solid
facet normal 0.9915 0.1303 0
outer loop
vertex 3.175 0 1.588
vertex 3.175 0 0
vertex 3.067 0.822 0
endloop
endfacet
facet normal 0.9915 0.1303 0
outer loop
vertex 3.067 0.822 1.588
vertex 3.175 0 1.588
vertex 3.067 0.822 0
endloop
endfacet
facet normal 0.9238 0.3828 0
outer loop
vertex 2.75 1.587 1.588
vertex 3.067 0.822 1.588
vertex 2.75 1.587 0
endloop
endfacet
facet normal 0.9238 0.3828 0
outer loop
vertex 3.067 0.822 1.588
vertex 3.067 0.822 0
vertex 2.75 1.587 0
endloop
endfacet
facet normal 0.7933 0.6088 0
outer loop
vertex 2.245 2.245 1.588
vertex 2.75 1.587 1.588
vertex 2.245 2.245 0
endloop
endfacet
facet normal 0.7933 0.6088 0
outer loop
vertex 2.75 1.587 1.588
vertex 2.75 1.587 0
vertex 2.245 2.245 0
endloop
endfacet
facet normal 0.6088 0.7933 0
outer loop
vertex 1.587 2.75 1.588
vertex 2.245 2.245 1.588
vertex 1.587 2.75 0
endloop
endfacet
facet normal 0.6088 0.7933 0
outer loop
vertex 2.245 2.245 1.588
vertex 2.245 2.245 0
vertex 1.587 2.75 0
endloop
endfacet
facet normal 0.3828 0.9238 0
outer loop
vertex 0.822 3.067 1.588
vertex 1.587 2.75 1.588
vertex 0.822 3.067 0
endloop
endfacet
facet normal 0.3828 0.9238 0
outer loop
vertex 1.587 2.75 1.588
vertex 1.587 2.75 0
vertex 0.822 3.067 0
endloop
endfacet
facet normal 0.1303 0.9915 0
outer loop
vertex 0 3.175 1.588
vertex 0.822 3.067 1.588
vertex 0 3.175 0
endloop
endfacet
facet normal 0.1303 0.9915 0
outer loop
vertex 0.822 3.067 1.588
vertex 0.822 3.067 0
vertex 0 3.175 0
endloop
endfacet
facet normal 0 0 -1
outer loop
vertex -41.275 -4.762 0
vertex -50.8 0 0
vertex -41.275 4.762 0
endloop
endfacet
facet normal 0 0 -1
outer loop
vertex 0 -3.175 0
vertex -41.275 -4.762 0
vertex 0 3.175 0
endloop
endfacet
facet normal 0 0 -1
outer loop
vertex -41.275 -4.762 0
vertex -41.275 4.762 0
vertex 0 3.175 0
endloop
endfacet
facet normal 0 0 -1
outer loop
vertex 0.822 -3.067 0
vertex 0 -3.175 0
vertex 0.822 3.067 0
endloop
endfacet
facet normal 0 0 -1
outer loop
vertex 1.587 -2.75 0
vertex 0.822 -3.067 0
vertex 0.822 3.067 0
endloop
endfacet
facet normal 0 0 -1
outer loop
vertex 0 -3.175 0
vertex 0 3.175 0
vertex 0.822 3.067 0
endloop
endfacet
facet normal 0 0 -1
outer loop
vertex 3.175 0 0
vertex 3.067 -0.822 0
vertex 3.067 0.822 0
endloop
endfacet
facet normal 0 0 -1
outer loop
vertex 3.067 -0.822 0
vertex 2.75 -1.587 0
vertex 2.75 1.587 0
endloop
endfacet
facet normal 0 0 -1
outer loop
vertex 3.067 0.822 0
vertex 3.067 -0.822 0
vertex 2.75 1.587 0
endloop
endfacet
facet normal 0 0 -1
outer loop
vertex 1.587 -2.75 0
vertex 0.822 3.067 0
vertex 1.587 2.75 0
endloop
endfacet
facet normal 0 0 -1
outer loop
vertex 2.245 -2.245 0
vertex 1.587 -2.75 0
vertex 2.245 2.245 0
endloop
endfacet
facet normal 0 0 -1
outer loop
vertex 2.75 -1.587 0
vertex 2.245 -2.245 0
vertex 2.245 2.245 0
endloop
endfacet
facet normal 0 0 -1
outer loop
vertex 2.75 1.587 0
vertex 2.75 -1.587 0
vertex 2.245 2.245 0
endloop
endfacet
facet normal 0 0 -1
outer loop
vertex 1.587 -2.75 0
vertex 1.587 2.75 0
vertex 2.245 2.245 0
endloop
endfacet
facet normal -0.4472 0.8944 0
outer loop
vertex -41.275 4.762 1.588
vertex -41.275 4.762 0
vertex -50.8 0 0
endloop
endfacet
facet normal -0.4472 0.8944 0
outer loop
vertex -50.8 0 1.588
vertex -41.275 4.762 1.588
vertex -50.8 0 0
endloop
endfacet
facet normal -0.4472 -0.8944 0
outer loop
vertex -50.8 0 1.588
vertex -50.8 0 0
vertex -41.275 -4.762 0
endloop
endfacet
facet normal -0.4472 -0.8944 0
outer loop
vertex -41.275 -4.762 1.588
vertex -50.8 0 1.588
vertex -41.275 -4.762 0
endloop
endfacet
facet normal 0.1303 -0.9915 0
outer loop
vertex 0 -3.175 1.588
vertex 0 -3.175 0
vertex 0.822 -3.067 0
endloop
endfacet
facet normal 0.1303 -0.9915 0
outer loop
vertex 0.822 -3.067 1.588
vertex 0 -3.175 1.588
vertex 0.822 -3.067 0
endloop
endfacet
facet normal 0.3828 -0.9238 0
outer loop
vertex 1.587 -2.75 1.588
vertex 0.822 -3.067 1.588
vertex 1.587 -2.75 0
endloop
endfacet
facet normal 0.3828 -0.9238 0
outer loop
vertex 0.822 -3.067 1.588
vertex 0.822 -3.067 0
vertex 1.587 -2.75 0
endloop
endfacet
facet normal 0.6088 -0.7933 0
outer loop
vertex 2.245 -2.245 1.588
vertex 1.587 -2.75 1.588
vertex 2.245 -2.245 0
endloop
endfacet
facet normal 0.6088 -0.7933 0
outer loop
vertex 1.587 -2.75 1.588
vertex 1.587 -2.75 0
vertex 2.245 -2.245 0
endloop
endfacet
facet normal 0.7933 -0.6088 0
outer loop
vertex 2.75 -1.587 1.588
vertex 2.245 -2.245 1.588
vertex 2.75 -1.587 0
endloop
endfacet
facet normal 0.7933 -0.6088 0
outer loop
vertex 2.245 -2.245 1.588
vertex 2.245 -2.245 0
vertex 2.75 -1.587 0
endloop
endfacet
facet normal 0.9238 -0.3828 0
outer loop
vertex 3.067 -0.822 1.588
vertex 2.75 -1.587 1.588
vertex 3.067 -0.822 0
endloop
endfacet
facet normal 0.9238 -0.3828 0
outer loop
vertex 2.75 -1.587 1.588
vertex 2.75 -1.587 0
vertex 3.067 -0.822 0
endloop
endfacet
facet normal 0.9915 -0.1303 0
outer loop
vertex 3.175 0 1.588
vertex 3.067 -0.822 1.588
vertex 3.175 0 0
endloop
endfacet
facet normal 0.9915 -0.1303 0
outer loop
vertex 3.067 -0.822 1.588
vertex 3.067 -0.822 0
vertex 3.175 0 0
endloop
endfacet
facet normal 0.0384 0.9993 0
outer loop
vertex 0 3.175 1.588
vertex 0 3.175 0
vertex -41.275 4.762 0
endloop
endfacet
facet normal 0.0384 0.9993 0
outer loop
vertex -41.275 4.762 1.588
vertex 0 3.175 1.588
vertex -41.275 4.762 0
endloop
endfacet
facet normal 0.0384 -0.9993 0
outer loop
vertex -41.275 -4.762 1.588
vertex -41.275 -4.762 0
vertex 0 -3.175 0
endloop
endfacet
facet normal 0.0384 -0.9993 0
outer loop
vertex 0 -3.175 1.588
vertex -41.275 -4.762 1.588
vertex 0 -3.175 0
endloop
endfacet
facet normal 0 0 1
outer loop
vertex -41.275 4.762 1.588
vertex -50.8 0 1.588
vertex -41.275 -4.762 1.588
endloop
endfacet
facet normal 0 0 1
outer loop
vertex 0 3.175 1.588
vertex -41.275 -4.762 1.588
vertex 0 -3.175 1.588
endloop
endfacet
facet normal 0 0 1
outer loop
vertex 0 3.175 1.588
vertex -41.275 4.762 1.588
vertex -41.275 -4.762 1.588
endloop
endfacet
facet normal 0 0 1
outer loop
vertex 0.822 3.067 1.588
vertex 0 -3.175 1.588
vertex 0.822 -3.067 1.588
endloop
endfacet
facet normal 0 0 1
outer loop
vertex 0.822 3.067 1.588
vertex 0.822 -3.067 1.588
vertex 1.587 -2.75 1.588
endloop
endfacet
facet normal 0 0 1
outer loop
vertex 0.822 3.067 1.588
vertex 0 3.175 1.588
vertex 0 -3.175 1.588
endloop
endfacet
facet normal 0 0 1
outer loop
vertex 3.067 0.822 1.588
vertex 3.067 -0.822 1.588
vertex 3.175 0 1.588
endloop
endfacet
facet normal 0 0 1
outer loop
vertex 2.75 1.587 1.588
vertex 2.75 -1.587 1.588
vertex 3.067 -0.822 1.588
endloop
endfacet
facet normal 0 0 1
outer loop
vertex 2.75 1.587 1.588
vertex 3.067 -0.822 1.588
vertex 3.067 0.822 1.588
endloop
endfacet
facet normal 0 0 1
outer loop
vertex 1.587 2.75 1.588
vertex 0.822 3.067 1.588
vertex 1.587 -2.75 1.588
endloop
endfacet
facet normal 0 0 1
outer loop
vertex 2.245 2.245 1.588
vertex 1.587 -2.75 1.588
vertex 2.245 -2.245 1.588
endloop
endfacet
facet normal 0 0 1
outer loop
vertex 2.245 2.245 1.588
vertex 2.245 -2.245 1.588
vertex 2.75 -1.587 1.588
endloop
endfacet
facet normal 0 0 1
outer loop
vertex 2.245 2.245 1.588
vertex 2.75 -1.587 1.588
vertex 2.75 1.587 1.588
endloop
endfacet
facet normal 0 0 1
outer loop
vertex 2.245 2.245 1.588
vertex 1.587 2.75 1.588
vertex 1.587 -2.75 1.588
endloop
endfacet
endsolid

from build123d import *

# Parameters (mm, degrees)
F1_DEPTH = 1.5875


with BuildPart() as f1:
    # F0 (on Top) → F1 (new body)
    with BuildSketch(Plane.XY):
        with BuildLine():
            ThreePointArc((-3.175, 0), (-2.245064, 2.245064), (0, 3.175))
            Line((0, 3.175), (-41.275, 4.7625))
            Line((-41.275, 4.7625), (-50.8, 0))
            Line((-50.8, 0), (-3.175, 0))
        make_face()
        with BuildLine():
            ThreePointArc((0, -3.175), (2.245064, -2.245064), (3.175, 0))
            ThreePointArc((3.175, 0), (2.245064, 2.245064), (0, 3.175))
            ThreePointArc((0, 3.175), (-2.245064, 2.245064), (-3.175, 0))
            ThreePointArc((-3.175, 0), (-2.245064, -2.245064), (0, -3.175))
        make_face()
        with BuildLine():
            Line((-41.275, -4.7625), (0, -3.175))
            ThreePointArc((0, -3.175), (-2.245064, -2.245064), (-3.175, 0))
            Line((-3.175, 0), (-50.8, 0))
            Line((-50.8, 0), (-41.275, -4.7625))
        make_face()
    extrude(amount=F1_DEPTH)


with BuildPart() as f2_1:
    # F2: copy of F1
    add(f1.part)


solid = f1.part
